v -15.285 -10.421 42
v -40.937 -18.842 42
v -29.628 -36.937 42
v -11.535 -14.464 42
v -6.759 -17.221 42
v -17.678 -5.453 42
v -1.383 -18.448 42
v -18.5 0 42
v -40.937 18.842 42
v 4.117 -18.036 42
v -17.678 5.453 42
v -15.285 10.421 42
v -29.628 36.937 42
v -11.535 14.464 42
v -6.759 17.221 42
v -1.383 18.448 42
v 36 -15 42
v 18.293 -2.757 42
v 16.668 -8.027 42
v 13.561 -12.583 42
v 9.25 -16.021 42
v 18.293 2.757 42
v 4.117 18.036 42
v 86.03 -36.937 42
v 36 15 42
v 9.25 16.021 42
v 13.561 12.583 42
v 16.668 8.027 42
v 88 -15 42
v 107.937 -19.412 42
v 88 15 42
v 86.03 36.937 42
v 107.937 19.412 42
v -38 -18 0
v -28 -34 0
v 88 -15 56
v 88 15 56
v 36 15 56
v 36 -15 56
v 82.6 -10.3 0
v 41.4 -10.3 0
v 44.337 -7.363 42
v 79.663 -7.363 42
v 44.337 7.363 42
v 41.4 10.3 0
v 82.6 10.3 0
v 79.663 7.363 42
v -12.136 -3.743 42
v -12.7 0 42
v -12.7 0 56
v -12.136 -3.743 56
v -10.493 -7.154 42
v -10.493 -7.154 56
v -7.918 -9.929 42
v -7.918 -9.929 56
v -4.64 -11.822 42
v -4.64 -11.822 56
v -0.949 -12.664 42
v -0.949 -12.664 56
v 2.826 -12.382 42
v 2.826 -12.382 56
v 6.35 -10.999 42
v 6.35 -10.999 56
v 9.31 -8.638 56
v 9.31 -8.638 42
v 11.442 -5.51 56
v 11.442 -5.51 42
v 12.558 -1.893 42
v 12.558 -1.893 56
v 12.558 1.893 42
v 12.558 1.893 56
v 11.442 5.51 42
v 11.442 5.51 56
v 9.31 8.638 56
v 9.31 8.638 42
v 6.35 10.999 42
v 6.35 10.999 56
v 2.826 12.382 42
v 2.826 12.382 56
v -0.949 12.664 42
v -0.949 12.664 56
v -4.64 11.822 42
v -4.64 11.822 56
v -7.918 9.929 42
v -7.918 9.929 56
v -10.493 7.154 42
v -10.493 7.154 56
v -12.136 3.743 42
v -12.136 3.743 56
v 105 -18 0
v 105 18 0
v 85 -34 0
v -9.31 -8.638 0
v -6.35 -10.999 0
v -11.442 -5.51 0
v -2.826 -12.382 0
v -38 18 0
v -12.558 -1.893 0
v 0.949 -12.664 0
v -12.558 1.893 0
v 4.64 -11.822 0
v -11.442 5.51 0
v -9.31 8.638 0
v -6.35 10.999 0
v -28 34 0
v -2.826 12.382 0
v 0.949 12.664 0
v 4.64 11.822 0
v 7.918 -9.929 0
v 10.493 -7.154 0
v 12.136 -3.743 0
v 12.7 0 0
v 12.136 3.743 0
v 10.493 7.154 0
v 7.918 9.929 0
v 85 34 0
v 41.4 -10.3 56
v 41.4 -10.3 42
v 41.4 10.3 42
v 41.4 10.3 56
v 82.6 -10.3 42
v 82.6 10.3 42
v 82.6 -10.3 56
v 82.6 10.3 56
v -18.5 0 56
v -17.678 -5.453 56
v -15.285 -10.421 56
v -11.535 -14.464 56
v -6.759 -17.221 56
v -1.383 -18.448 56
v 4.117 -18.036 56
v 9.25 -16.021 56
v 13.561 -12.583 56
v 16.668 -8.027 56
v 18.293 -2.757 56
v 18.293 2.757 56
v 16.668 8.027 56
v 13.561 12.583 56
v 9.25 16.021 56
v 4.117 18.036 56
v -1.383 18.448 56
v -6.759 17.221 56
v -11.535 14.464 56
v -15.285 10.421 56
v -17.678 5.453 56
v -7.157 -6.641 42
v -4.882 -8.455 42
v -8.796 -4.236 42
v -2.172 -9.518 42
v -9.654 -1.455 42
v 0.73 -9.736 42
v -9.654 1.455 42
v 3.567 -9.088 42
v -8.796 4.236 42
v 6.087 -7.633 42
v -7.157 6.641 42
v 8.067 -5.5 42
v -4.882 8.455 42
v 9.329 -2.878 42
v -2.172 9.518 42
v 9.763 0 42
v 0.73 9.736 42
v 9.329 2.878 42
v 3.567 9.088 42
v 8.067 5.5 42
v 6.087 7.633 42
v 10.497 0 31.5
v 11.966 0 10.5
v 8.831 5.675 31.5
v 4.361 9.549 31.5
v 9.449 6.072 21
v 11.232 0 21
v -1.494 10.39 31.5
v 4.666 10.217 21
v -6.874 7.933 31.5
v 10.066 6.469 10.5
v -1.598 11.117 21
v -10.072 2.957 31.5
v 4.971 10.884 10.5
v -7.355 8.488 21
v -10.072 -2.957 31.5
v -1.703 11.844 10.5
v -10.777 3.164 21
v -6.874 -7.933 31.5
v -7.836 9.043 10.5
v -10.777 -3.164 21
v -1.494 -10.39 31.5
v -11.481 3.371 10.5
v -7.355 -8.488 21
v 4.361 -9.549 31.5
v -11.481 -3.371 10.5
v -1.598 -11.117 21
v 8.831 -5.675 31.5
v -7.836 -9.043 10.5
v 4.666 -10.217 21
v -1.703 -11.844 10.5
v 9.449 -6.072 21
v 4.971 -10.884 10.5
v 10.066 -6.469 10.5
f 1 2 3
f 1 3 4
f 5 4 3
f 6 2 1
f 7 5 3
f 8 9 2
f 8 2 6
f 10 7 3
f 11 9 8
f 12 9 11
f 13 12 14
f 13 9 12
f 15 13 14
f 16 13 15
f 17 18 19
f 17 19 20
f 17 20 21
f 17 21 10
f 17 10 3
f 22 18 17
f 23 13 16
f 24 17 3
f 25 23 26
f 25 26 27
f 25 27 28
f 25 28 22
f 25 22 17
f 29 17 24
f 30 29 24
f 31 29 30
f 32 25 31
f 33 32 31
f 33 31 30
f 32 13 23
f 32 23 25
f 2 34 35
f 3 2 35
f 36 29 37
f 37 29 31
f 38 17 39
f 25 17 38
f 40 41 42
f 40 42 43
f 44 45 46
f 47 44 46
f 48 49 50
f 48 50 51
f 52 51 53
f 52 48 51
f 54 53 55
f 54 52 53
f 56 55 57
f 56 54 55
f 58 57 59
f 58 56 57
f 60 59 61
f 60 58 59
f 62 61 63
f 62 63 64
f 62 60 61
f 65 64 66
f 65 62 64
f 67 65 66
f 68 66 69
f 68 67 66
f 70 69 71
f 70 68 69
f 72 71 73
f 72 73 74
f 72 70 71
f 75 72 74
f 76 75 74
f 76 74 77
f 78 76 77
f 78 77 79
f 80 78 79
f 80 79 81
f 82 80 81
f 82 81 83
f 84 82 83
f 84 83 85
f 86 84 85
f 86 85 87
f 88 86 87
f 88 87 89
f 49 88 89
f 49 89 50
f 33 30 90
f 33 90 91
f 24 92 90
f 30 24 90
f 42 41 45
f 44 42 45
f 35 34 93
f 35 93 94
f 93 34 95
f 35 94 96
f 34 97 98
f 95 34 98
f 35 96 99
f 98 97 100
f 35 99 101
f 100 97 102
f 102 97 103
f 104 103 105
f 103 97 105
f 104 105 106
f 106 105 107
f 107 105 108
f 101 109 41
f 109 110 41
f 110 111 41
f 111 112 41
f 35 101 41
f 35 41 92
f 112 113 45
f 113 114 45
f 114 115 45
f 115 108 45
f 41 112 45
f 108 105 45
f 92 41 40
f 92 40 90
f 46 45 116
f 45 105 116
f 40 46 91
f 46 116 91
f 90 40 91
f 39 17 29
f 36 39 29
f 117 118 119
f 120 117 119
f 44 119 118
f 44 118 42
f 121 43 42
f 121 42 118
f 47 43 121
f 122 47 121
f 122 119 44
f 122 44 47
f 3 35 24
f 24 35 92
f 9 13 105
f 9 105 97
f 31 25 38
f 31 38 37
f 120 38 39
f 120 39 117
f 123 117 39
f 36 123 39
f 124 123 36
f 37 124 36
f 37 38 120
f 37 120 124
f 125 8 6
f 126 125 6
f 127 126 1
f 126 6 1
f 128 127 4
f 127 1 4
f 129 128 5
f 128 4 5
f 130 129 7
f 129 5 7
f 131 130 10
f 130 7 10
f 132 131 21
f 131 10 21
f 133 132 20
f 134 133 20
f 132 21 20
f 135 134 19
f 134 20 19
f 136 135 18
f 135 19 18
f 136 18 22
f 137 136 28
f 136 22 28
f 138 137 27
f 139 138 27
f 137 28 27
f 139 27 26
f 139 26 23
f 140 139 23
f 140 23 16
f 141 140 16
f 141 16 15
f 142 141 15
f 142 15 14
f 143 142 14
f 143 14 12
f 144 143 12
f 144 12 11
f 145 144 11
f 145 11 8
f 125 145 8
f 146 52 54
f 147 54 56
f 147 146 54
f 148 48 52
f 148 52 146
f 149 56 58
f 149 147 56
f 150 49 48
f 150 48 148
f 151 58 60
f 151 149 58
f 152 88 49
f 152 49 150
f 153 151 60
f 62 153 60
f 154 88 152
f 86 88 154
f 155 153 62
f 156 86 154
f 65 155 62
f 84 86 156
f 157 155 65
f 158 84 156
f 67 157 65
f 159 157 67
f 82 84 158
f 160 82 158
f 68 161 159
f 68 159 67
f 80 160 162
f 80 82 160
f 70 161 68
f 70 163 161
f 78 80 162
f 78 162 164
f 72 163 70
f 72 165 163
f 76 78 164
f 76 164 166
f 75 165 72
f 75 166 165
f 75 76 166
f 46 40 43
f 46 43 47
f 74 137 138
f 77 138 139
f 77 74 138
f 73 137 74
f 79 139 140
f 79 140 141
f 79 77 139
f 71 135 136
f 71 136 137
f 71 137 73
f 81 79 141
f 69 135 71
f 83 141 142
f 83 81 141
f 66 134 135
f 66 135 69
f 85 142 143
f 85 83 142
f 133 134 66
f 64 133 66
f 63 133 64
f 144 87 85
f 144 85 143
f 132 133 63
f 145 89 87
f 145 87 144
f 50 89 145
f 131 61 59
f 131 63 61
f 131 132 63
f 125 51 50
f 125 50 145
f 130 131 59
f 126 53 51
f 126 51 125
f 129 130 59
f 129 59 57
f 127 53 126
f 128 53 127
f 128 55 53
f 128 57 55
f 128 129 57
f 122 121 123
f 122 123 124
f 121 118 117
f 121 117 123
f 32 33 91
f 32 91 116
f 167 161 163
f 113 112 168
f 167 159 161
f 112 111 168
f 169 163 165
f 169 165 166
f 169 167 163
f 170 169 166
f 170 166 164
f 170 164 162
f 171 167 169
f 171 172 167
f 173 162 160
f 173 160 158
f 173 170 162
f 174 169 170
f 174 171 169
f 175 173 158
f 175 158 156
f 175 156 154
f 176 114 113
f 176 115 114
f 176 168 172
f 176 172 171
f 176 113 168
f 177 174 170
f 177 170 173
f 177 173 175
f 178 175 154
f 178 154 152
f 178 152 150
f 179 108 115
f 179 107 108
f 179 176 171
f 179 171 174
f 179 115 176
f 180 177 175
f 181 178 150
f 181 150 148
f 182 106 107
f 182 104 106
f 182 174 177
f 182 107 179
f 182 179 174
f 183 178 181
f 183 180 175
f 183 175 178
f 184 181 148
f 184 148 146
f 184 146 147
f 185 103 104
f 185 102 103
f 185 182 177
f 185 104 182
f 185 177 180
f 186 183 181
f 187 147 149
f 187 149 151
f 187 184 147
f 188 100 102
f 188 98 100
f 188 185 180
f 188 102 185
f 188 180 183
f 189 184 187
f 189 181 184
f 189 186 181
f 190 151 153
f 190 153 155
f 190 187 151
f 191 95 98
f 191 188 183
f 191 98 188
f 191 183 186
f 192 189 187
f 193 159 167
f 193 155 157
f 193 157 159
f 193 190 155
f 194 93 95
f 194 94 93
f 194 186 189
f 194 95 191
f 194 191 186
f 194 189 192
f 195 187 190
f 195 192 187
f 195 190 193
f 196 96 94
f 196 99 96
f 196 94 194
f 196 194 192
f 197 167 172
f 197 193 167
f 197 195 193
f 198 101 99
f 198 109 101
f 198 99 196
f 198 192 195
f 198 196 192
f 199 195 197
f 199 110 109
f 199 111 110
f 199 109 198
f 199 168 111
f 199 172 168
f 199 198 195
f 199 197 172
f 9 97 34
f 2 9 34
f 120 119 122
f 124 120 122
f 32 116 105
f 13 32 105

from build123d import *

# Parameters (mm, degrees)
SKETCH1_R           = 12.7
SKETCH1_W           = 41.2
SKETCH1_H           = 20.6
BOSS_EXTRUDE1_DEPTH = 42
BOSS_EXTRUDE1_DRAFT = -4
SKETCH2_R           = 18.5
SKETCH2_R_2         = 12.7
SKETCH2_W           = 52
SKETCH2_H           = 30
SKETCH2_W_2         = 41.2
SKETCH2_H_2         = 20.6
BOSS_EXTRUDE2_DEPTH = 56


with BuildPart() as part:
    # Sketch1 → Boss-Extrude1 (with draft: the straight prism first)
    with BuildSketch(Plane.XY):
        Polygon((-28, 34), (-38, 18), (-38, -18), (-28, -34), (85, -34), (105, -18), (105, 18), (85, 34), align=None)
        Circle(SKETCH1_R, mode=Mode.SUBTRACT)
        with Locations((62, 0)):
            Rectangle(SKETCH1_W, SKETCH1_H, mode=Mode.SUBTRACT)
    extrude(amount=BOSS_EXTRUDE1_DEPTH)
    # Boss-Extrude1: the draft: its side faces are tilted about the plane it starts from
    boss_extrude1_sides = [part.faces().sort_by_distance(p)[0] for p in [
        (-33, 26, 21),
        (-38, 0, 21),
        (-33, -26, 21),
        (28.5, -34, 21),
        (95, -26, 21),
        (105, 0, 21),
        (95, 26, 21),
        (28.5, 34, 21),
        (-12.7, 0, 21),
        (41.4, 0, 21),
        (62, 10.3, 21),
        (82.6, 0, 21),
        (62, -10.3, 21),
    ]]
    draft(boss_extrude1_sides, Plane.XY, BOSS_EXTRUDE1_DRAFT)

    # Sketch2 → Boss-Extrude2 (add)
    # profile 1 of 2: a face of its own
    with BuildSketch(Plane.XY):
        with Locations(Location((0, 0, 0), (0, 0, 180))):
            Circle(SKETCH2_R)
        with Locations(Location((0, 0, 0), (0, 0, 180))):
            Circle(SKETCH2_R_2, mode=Mode.SUBTRACT)
    # profile 2 of 2: a face of its own
    with BuildSketch(Plane.XY):
        with Locations((62, 0)):
            Rectangle(SKETCH2_W, SKETCH2_H)
        with Locations((62, 0)):
            Rectangle(SKETCH2_W_2, SKETCH2_H_2, mode=Mode.SUBTRACT)
    extrude(amount=BOSS_EXTRUDE2_DEPTH)


solid = part.part
